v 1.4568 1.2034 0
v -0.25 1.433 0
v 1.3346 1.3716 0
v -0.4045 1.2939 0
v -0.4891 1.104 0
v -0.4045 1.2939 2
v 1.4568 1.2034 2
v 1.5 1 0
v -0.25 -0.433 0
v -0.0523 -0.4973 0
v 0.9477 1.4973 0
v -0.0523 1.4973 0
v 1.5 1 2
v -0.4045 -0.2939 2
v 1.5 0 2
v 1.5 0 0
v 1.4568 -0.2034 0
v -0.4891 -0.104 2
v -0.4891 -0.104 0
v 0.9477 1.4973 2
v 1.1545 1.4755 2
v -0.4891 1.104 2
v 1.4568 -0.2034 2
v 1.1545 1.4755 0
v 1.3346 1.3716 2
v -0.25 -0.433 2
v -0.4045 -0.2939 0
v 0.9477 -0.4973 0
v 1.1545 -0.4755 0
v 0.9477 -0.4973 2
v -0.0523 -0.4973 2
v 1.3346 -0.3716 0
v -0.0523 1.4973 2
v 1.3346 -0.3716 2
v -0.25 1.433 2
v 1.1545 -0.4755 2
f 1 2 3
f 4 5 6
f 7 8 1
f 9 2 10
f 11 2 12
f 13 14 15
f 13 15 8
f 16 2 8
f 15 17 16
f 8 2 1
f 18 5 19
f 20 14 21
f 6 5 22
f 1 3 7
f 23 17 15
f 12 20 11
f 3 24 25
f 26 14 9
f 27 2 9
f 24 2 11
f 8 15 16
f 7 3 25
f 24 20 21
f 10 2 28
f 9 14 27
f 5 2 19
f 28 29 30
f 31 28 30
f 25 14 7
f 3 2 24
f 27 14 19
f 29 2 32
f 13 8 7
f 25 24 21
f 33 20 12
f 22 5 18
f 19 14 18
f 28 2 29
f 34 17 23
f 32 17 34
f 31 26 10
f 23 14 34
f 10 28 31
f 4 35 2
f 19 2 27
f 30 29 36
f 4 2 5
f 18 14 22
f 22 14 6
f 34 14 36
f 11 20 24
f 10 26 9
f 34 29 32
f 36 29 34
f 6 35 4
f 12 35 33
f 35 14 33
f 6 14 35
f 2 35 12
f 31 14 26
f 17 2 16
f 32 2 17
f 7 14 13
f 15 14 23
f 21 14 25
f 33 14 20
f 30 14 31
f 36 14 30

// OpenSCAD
$fn=15;
minkowski(){
	cube([1,1,1]);
	cylinder(r=0.5,h=1);
}
